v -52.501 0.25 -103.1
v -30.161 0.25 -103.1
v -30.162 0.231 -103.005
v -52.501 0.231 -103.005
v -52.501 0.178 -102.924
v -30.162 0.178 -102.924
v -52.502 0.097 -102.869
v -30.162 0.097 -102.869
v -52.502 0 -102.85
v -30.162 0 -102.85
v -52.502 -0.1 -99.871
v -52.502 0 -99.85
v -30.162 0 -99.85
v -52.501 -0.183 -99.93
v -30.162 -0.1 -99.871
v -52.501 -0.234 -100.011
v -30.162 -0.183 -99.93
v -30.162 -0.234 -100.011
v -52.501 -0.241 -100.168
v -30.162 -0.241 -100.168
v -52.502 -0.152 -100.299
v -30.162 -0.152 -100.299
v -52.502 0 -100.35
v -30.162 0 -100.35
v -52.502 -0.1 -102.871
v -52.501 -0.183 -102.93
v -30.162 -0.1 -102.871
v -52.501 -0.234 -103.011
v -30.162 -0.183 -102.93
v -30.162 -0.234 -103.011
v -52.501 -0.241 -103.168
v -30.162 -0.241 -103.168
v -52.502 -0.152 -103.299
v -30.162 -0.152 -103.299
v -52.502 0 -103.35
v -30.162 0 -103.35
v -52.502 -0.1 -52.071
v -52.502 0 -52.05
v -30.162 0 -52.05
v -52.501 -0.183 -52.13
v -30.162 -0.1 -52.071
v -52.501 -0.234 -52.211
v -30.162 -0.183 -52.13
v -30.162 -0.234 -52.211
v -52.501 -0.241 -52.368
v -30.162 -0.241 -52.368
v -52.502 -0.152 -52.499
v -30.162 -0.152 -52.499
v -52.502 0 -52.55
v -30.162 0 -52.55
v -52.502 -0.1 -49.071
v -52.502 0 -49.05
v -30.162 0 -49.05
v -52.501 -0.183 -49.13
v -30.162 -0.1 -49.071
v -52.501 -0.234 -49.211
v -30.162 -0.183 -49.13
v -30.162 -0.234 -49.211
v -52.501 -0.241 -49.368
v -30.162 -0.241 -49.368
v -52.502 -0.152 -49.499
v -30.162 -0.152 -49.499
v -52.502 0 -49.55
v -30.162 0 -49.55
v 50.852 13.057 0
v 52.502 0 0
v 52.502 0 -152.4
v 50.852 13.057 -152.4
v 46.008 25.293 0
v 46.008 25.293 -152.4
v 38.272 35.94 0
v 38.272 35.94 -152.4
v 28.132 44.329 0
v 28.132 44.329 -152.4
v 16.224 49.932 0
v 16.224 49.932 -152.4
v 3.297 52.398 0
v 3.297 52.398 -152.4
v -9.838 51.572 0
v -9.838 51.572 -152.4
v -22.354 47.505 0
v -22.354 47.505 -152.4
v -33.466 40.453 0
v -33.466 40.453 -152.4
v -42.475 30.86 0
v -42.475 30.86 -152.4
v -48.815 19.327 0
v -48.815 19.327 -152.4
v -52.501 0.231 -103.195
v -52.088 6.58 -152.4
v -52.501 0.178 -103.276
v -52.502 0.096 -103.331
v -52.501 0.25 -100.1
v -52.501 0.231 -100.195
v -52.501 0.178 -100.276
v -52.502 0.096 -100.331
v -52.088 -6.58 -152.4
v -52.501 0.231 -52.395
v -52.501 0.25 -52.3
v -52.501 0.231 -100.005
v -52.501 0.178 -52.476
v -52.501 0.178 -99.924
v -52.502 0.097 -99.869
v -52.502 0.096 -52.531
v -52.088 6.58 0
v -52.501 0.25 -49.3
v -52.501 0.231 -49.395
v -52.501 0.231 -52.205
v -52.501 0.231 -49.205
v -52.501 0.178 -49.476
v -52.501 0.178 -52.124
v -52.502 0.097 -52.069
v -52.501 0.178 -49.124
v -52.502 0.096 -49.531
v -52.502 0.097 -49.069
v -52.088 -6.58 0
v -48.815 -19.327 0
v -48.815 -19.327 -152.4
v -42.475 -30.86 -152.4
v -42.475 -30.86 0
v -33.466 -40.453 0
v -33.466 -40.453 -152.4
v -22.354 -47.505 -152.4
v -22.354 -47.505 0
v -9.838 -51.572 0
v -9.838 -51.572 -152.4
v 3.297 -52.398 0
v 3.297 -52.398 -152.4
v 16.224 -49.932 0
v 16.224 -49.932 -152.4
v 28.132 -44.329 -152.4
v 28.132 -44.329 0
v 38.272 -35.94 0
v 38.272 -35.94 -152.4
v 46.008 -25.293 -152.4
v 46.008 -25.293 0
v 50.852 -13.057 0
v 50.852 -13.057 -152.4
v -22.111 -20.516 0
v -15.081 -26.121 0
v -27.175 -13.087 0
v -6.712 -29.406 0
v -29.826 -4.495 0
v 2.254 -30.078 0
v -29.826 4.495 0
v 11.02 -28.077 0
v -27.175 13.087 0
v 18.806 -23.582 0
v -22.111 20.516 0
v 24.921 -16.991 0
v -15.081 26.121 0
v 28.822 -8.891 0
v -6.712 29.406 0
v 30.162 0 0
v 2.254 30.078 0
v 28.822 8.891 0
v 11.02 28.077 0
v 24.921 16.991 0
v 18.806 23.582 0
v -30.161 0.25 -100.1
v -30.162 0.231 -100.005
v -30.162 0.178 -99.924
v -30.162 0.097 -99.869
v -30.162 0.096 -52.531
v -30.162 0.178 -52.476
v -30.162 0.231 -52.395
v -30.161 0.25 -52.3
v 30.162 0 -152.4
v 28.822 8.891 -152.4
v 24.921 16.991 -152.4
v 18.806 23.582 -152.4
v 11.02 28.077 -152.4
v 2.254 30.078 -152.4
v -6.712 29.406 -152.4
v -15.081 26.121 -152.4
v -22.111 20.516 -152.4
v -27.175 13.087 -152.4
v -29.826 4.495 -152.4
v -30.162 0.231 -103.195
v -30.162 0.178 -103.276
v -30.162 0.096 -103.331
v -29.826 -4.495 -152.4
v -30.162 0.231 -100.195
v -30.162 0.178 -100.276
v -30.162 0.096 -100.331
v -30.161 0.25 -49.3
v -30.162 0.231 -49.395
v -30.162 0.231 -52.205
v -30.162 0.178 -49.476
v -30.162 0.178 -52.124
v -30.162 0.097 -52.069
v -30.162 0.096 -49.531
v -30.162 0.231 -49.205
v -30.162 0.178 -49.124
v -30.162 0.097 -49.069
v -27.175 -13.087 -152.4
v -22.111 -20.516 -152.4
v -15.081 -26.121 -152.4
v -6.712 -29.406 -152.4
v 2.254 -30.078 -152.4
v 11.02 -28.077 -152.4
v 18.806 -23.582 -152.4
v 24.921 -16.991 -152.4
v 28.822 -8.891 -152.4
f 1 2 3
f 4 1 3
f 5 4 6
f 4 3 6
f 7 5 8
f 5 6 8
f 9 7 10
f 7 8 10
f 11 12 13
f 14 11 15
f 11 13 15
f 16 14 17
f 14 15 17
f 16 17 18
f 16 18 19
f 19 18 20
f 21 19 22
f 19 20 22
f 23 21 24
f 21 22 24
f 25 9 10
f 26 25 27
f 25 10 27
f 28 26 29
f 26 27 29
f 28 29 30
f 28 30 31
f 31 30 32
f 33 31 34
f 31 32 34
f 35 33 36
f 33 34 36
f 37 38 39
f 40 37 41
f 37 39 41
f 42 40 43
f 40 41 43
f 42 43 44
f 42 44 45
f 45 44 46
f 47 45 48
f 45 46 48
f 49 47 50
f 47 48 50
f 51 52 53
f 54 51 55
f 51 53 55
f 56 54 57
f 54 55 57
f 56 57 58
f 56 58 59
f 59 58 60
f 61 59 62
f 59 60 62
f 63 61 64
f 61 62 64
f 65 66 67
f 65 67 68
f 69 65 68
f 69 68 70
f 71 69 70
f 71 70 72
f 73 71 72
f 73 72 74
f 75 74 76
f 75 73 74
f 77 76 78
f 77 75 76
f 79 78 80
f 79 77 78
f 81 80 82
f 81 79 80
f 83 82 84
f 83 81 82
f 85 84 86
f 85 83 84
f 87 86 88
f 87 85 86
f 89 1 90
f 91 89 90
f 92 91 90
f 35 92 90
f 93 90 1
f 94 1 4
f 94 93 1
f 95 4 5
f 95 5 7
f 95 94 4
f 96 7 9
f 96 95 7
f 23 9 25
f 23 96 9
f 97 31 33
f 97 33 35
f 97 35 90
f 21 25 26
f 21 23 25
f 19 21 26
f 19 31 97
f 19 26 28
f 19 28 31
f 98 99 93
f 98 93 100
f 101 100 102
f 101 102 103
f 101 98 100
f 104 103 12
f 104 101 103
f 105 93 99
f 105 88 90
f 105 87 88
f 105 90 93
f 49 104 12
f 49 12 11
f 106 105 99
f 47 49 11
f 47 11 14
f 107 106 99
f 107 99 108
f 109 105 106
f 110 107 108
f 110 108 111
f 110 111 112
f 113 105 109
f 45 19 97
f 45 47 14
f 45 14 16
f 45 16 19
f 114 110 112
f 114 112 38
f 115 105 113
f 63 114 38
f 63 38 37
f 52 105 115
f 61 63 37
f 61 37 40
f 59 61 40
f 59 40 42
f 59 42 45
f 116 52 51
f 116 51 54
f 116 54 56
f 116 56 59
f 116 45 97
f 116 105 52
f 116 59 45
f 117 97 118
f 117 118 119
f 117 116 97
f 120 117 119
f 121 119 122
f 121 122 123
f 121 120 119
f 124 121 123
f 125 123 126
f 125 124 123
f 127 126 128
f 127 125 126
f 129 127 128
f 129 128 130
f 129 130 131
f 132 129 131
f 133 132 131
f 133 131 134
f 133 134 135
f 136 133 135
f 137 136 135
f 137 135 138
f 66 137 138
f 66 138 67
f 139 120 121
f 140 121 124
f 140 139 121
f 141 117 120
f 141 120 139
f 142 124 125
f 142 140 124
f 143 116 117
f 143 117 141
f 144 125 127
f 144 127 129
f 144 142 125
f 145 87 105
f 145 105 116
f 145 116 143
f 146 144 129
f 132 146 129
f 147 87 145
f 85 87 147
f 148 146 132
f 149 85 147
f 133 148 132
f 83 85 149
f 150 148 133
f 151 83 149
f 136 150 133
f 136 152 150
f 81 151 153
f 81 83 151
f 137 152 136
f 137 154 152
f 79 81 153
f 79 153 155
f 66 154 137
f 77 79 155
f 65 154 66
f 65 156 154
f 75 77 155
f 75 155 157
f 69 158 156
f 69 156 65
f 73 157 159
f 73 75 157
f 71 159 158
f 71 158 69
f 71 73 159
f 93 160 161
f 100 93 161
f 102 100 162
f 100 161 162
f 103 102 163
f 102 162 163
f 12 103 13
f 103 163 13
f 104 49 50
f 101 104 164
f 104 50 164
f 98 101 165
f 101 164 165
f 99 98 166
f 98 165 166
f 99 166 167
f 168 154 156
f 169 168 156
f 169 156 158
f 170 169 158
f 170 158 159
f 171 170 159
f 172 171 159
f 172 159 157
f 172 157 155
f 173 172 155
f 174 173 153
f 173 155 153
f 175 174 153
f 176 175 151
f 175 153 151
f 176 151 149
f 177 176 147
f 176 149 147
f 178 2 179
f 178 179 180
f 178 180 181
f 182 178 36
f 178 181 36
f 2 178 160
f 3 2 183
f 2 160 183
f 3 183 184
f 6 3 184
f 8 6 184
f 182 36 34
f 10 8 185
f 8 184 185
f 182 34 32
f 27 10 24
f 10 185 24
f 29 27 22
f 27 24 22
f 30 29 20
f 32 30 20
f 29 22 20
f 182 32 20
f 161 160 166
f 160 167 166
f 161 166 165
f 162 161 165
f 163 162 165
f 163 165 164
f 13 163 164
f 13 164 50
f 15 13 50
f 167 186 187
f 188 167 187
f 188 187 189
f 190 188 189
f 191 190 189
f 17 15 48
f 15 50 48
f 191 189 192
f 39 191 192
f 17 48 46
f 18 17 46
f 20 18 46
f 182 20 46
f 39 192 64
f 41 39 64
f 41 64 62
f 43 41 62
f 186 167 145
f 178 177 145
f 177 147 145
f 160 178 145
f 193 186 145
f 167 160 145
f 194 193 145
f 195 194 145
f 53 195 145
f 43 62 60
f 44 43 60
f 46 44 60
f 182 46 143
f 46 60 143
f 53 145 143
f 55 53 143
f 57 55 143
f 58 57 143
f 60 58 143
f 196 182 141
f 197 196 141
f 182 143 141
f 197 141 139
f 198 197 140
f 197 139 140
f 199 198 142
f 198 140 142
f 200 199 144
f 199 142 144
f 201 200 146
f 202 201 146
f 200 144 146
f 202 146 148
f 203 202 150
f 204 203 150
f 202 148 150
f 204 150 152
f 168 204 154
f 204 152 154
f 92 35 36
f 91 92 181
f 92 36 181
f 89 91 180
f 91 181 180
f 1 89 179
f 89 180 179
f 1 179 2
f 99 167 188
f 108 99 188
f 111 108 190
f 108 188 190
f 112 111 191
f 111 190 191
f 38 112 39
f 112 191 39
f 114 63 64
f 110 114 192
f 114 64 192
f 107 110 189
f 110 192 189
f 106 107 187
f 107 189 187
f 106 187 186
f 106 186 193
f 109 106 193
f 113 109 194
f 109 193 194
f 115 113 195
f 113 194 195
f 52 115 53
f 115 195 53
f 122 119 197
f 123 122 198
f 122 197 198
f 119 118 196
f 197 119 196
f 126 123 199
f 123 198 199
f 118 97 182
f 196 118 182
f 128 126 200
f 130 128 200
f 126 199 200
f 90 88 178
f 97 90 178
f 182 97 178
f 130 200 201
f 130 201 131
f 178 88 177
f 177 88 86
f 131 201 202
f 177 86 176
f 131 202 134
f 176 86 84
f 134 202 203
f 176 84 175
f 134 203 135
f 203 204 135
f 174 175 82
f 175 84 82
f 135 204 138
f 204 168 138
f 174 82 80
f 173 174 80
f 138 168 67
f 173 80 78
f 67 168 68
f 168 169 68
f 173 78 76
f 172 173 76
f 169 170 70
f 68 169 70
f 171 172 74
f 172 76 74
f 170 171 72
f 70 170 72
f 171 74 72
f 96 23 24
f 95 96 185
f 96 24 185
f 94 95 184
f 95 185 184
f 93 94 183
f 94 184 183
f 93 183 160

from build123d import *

# Parameters (mm, degrees)
F0_R     = 52.5018
F0_R_2   = 30.1625
F1_DEPTH = 152.4
F3_DEPTH = 52.5028


# Not quite as in the source:
# - a feature names something its author has since deleted; it is built from what else it names


with BuildPart() as f1:
    # F0 (on Top) → F1 (new body)
    with BuildSketch(Plane.XY):
        Circle(F0_R)
        Circle(F0_R_2, mode=Mode.SUBTRACT)
    extrude(amount=-F1_DEPTH)

    # F2 (on Right) → F3 (cut, through all)
    with BuildSketch(Plane.YZ):
        with BuildLine():
            ThreePointArc((0.25, -49.3), (0.1767766953, -49.1232233047), (0, -49.05))
            Line((0, -49.05), (0, -49.55))
            ThreePointArc((0, -49.55), (0.1767766953, -49.4767766953), (0.25, -49.3))
        make_face()
        with BuildLine():
            ThreePointArc((0.25, -103.1), (0.1767766953, -102.9232233047), (0, -102.85))
            Line((0, -102.85), (0, -103.35))
            ThreePointArc((0, -103.35), (0.1767766953, -103.2767766953), (0.25, -103.1))
        make_face()
        with BuildLine():
            Line((0, -103.35), (0, -102.85))
            ThreePointArc((0, -102.85), (-0.25, -103.1), (0, -103.35))
        make_face()
        with BuildLine():
            ThreePointArc((0.25, -100.1), (0.1767766953, -99.9232233047), (0, -99.85))
            Line((0, -99.85), (0, -100.35))
            ThreePointArc((0, -100.35), (0.1767766953, -100.2767766953), (0.25, -100.1))
        make_face()
        with BuildLine():
            Line((0, -100.35), (0, -99.85))
            ThreePointArc((0, -99.85), (-0.25, -100.1), (0, -100.35))
        make_face()
        with BuildLine():
            ThreePointArc((0.25, -52.3), (0.1767766953, -52.1232233047), (0, -52.05))
            Line((0, -52.05), (0, -52.55))
            ThreePointArc((0, -52.55), (0.1767766953, -52.4767766953), (0.25, -52.3))
        make_face()
        with BuildLine():
            Line((0, -52.55), (0, -52.05))
            ThreePointArc((0, -52.05), (-0.25, -52.3), (0, -52.55))
        make_face()
        with BuildLine():
            Line((0, -49.55), (0, -49.05))
            ThreePointArc((0, -49.05), (-0.25, -49.3), (0, -49.55))
        make_face()
    extrude(amount=-F3_DEPTH, mode=Mode.SUBTRACT)


solid = f1.part
